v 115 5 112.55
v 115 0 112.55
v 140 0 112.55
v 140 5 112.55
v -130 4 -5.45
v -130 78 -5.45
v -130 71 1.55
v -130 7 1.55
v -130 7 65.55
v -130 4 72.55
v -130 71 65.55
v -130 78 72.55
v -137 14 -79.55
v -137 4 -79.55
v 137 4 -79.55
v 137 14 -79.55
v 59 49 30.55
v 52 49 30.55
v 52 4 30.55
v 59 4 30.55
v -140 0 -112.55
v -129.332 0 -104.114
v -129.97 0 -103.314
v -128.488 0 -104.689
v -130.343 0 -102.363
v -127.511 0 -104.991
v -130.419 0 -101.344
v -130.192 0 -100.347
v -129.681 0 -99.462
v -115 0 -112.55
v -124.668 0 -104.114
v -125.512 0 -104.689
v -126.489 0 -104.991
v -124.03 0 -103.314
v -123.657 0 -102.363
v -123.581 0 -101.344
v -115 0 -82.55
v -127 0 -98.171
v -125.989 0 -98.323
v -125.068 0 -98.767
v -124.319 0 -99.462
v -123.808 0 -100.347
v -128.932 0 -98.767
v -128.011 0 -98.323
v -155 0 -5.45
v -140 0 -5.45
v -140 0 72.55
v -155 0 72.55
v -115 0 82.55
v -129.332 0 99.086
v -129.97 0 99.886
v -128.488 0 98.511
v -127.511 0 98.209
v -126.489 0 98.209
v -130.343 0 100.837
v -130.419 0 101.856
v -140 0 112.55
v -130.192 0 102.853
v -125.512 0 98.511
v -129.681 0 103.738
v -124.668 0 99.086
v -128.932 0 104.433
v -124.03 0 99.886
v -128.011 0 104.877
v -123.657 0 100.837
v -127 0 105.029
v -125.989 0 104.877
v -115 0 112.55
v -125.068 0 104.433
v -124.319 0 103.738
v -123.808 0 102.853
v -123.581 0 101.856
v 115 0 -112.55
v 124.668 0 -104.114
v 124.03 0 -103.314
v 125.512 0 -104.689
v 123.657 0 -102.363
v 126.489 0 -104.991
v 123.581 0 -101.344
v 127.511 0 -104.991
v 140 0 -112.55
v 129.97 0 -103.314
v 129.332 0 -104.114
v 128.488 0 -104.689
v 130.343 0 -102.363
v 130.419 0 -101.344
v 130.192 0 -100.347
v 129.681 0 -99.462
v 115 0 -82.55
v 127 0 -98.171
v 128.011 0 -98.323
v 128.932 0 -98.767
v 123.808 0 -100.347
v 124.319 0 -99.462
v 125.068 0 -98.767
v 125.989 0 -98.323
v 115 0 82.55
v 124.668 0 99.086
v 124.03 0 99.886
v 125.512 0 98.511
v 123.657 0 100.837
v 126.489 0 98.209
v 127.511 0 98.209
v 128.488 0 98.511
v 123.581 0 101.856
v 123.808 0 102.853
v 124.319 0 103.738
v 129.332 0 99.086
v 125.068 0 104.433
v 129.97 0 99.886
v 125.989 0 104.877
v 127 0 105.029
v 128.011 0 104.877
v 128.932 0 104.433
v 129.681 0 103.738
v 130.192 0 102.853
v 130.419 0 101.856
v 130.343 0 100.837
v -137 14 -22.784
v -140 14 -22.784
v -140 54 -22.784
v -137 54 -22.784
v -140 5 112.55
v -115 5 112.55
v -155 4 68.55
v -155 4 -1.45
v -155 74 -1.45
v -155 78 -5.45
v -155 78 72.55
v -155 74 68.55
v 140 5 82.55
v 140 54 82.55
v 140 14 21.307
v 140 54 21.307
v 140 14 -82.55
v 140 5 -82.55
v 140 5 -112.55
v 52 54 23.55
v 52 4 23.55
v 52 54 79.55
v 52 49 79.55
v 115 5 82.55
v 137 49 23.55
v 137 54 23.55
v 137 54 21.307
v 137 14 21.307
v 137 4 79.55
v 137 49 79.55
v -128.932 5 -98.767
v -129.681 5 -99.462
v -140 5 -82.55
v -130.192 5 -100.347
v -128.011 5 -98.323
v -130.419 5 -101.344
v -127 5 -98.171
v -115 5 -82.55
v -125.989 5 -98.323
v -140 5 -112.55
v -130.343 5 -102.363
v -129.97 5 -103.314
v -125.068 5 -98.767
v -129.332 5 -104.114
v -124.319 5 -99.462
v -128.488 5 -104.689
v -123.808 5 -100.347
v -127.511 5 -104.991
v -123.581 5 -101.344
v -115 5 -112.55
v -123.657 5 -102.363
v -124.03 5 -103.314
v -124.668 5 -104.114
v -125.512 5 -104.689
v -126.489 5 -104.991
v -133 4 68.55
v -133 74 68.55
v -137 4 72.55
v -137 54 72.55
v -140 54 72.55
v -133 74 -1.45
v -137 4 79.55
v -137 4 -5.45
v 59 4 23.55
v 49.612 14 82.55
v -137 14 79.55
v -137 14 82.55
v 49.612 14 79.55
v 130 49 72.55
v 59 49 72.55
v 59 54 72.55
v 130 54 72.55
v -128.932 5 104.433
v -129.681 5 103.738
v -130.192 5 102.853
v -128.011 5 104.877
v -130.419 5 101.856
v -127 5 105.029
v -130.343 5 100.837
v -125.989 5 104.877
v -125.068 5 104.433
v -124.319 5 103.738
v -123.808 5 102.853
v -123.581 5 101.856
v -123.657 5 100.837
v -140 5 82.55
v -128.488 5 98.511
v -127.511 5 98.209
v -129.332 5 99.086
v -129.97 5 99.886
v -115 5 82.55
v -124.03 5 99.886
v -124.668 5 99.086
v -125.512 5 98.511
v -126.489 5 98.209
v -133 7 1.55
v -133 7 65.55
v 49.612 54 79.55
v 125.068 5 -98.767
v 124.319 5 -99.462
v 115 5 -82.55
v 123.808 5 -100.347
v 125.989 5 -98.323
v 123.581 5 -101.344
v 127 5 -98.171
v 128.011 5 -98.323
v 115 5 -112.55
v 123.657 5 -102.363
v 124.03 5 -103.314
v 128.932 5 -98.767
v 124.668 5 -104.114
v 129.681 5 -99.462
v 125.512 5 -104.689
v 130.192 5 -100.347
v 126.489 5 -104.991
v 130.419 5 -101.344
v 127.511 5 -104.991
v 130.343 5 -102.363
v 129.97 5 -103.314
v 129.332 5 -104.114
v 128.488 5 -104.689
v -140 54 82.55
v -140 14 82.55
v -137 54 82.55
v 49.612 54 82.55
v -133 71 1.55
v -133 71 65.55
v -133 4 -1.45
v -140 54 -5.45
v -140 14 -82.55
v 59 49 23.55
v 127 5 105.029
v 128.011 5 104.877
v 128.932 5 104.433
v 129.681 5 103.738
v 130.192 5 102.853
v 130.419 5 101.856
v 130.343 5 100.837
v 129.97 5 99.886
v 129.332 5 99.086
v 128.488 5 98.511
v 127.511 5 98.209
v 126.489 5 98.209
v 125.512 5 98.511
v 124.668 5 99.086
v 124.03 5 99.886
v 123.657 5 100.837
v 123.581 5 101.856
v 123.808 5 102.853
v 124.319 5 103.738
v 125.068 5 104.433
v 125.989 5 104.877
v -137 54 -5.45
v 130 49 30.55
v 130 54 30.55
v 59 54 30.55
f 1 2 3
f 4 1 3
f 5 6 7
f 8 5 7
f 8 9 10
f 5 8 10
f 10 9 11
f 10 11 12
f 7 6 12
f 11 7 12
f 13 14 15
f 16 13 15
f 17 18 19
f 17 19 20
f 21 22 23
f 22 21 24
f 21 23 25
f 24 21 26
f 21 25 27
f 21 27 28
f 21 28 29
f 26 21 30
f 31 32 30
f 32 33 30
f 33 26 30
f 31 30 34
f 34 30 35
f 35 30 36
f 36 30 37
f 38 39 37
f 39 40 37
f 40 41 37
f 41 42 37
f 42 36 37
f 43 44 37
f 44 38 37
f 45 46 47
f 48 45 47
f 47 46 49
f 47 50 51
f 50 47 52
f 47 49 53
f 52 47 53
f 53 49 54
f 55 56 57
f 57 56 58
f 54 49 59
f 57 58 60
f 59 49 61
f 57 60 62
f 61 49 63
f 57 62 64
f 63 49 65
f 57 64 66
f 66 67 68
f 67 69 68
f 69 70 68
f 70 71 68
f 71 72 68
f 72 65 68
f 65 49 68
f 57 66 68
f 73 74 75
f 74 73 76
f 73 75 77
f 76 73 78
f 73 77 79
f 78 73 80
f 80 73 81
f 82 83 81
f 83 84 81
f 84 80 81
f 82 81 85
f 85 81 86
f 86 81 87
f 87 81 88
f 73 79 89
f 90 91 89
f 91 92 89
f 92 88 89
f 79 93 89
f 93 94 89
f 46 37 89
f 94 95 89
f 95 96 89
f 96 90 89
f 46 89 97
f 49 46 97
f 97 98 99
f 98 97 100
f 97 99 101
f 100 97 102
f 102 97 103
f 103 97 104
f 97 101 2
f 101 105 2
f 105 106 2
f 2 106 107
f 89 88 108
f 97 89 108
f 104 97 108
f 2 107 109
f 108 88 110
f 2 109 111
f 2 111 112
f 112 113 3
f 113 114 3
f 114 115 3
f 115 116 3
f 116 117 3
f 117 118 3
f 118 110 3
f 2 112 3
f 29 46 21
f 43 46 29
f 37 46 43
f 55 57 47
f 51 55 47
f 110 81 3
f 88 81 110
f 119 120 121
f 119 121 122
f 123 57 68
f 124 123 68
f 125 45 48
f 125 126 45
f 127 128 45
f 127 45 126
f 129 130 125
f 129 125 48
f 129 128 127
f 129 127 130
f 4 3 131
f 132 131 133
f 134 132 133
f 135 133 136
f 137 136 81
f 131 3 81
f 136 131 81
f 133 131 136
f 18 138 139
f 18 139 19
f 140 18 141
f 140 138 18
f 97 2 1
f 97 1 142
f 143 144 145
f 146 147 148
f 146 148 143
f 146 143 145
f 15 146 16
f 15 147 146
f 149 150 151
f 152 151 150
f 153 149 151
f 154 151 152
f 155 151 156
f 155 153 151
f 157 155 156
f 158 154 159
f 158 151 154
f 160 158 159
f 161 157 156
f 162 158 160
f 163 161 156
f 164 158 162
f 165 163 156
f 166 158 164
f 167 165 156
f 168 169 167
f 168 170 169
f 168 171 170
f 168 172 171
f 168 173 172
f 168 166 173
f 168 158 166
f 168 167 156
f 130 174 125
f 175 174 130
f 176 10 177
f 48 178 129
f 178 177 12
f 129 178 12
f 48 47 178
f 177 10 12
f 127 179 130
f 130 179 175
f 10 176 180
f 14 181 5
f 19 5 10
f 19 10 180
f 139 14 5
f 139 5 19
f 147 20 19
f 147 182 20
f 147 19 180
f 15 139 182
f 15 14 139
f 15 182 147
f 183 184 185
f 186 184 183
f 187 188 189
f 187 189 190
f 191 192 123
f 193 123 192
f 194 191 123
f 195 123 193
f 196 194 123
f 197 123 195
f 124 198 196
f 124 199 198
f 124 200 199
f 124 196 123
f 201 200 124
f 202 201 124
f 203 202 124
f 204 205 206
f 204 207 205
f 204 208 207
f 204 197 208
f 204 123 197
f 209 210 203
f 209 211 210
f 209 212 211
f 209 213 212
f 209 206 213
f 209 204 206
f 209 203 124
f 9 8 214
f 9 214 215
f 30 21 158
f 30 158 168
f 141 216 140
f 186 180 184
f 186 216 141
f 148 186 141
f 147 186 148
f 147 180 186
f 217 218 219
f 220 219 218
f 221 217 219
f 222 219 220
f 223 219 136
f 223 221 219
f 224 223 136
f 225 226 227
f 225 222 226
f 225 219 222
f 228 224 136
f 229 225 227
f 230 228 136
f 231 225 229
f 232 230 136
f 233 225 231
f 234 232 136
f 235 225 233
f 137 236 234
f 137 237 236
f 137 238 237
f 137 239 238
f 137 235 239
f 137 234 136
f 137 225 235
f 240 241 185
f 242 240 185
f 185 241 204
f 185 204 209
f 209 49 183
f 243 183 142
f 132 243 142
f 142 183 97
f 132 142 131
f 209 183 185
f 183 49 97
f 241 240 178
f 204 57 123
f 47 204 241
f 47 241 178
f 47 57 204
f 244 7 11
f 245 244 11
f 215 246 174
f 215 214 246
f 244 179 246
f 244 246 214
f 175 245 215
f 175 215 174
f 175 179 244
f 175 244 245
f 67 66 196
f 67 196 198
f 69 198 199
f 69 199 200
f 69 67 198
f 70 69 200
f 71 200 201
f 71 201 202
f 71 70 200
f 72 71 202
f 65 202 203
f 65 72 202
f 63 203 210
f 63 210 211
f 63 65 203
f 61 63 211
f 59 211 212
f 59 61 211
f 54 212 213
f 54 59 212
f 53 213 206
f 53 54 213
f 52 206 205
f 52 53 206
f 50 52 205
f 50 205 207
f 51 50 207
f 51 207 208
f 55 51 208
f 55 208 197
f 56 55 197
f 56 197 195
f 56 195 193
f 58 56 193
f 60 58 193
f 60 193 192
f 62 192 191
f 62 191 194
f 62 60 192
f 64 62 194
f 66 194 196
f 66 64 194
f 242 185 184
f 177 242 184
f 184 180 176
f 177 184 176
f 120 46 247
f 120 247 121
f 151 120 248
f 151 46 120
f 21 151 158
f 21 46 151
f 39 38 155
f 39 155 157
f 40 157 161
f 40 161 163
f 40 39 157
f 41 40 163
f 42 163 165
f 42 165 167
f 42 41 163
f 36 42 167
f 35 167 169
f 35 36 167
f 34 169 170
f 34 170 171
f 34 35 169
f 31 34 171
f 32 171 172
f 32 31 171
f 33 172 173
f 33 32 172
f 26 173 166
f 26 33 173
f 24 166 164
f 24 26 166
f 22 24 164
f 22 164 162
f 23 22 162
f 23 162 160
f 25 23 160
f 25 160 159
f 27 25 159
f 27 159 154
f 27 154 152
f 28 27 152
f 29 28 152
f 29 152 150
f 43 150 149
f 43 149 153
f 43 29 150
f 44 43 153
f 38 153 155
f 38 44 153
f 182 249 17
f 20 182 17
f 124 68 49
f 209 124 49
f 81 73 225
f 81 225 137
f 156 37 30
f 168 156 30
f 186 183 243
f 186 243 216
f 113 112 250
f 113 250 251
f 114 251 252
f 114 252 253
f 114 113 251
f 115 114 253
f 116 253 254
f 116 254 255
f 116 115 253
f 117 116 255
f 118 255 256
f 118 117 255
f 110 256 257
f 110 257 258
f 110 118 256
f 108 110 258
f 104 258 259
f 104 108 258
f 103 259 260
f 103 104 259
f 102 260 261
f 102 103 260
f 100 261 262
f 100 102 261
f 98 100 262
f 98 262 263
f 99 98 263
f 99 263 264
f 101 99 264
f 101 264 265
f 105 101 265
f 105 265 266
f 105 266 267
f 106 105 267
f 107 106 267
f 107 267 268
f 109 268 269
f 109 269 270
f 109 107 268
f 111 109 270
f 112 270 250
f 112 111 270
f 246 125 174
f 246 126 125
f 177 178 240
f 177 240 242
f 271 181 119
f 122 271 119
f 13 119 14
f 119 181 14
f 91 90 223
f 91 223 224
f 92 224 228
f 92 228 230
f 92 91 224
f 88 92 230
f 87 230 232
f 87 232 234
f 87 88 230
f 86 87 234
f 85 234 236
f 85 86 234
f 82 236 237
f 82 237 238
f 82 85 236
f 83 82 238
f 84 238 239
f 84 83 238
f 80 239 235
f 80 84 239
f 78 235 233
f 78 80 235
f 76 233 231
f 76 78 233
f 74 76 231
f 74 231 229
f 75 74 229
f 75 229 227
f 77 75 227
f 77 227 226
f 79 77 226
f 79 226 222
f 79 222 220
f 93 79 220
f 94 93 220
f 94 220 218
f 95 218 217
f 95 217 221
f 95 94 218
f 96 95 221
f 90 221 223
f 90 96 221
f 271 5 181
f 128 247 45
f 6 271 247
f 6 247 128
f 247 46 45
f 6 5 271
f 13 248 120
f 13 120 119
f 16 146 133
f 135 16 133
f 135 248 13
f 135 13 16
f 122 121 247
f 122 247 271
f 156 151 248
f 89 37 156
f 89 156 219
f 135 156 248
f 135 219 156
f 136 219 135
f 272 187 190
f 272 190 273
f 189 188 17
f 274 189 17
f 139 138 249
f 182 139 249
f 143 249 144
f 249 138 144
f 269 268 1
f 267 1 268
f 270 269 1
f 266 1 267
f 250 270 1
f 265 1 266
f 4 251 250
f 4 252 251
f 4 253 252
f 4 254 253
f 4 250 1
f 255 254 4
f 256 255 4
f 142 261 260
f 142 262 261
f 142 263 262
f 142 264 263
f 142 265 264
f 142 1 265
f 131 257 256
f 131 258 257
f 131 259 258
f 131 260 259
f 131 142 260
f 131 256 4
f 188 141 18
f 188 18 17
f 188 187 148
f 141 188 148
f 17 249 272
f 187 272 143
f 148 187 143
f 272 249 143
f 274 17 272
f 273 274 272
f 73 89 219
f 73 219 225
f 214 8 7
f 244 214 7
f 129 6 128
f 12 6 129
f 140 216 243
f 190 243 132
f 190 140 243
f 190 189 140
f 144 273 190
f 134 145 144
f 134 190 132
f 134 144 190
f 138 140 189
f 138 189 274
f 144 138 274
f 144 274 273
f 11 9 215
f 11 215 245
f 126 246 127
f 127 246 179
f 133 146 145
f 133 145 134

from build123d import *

# Parameters (mm, degrees)
SKETCH1_W             = 280
SKETCH1_H             = 165.1
FLOOR_2_DEPTH         = 4
SKETCH2_W             = 280
SKETCH2_H             = 165.1
SKETCH2_W_2           = 274
SKETCH2_H_2           = 159.1
WALL_DEPTH            = 10
RPI_START             = 45
SKETCH4_W             = 85
SKETCH4_H             = 56
SKETCH4_W_2           = 71
SKETCH4_H_2           = 42
RPI_STAND_DEPTH       = 5
SKETCH7_W             = 3
SKETCH7_H             = 105.333904831
TEMP_SUPPORT_DEPTH    = 40
SKETCH3_W             = 25
SKETCH3_H             = 30
SKETCH3_R             = 3.429
BRACKETS_DEPTH        = 5
FAN_HOLDER_DEPTH      = 15
FAN_HOLDER_DEPTH_BACK = 10
SKETCH5_W             = 78
SKETCH5_H             = 78
SKETCH5_W_2           = 70
SKETCH5_H_2           = 70
SKETCH8_W             = 70
SKETCH8_H             = 50
FAN_HOLE_DEPTH        = 3
SKETCH11_W            = 78
SKETCH11_H            = 78
SKETCH11_W_2          = 64
SKETCH11_H_2          = 64
BOSS_EXTRUDE9_DEPTH   = 3
BOSS_EXTRUDE10_REACH  = 199.721
SKETCH12_W            = 7
SKETCH12_H            = 7


with BuildPart() as part:
    # Sketch1 → Floor 2 (new body)
    with BuildSketch(Plane(origin=(0, 0, 0), x_dir=(1, 0, 0), z_dir=(0, 1, 0))):
        Rectangle(SKETCH1_W, SKETCH1_H)
    extrude(amount=FLOOR_2_DEPTH)

    # Sketch2 → Wall (add)
    with BuildSketch(Plane(origin=(0, 4, 0), x_dir=(1, 0, 0), z_dir=(0, 1, 0))):
        Rectangle(SKETCH2_W, SKETCH2_H)
        Rectangle(SKETCH2_W_2, SKETCH2_H_2, mode=Mode.SUBTRACT)
    extrude(amount=WALL_DEPTH)

    # Sketch7 → Temp support (add)
    with BuildSketch(Plane(origin=(0, 14, 0), x_dir=(1, 0, 0), z_dir=(0, 1, 0))):
        with Locations((-138.5, -29.883047585)):
            Rectangle(SKETCH7_W, SKETCH7_H)
        Polygon((140, -82.55), (49.61228981, -82.55), (49.61228981, -79.55), (137, -79.55), (137, -21.306937857), (140, -21.306937857), (140, -79.55), align=None)
    extrude(amount=TEMP_SUPPORT_DEPTH)

    # Sketch3 → Brackets (add)
    # profile 1 of 4: a face of its own
    with BuildSketch(Plane(origin=(0, 0, 0), x_dir=(1, 0, 0), z_dir=(0, 1, 0))):
        with Locations((-127.5, 97.55)):
            Rectangle(SKETCH3_W, SKETCH3_H)
        with Locations(Location((-127, 101.6, 0), (0, 0, 270))):
            Circle(SKETCH3_R, mode=Mode.SUBTRACT)
    # profile 2 of 4: a face of its own
    with BuildSketch(Plane(origin=(0, 0, 0), x_dir=(1, 0, 0), z_dir=(0, 1, 0))):
        with Locations((127.5, 97.55)):
            Rectangle(SKETCH3_W, SKETCH3_H)
        with Locations(Location((127, 101.6, 0), (0, 0, 270))):
            Circle(SKETCH3_R, mode=Mode.SUBTRACT)
    # profile 3 of 4: a face of its own
    with BuildSketch(Plane(origin=(0, 0, 0), x_dir=(1, 0, 0), z_dir=(0, 1, 0))):
        with Locations((-127.5, -97.55)):
            Rectangle(SKETCH3_W, SKETCH3_H)
        with Locations(Location((-127, -101.6, 0), (0, 0, 270))):
            Circle(SKETCH3_R, mode=Mode.SUBTRACT)
    # profile 4 of 4: a face of its own
    with BuildSketch(Plane(origin=(0, 0, 0), x_dir=(1, 0, 0), z_dir=(0, 1, 0))):
        with Locations((127.5, -97.55)):
            Rectangle(SKETCH3_W, SKETCH3_H)
        with Locations(Location((127, -101.6, 0), (0, 0, 270))):
            Circle(SKETCH3_R, mode=Mode.SUBTRACT)
    extrude(amount=BRACKETS_DEPTH)

    # Sketch5 → Fan Holder (add, two sides: drawn at the far end of the back side and taken through both)
    with BuildSketch(Plane.ZY.offset(140).offset(-FAN_HOLDER_DEPTH_BACK)):
        with Locations((33.55, 39)):
            Rectangle(SKETCH5_W, SKETCH5_H)
        with Locations((33.55, 39)):
            Rectangle(SKETCH5_W_2, SKETCH5_H_2, mode=Mode.SUBTRACT)
    extrude(amount=FAN_HOLDER_DEPTH + FAN_HOLDER_DEPTH_BACK)

    # Sketch8 → Fan hole (cut)
    with BuildSketch(Plane.ZY.offset(140)):
        with Locations((33.55, 29)):
            Rectangle(SKETCH8_W, SKETCH8_H)
    extrude(amount=-FAN_HOLE_DEPTH, mode=Mode.SUBTRACT)

    # Sketch11 → Boss-Extrude9 (add)
    with BuildSketch(Plane.ZY.offset(130)):
        with Locations((33.55, 39)):
            Rectangle(SKETCH11_W, SKETCH11_H)
        with Locations((33.55, 39)):
            Rectangle(SKETCH11_W_2, SKETCH11_H_2, mode=Mode.SUBTRACT)
    extrude(amount=BOSS_EXTRUDE9_DEPTH)

    # Sketch12 → Boss-Extrude10 (add, up to next)
    with BuildSketch(Plane.XZ.offset(-49), mode=Mode.PRIVATE) as boss_extrude10_sk1:
        with Locations((55.5, 27.05)):
            Rectangle(SKETCH12_W, SKETCH12_H)
    boss_extrude10_tool1 = extrude(boss_extrude10_sk1.sketch, amount=BOSS_EXTRUDE10_REACH, mode=Mode.PRIVATE) - part.part


with BuildPart() as body_2:
    # Sketch4 → Rpi stand (new body)
    with BuildSketch(Plane(origin=(0, 4, 0), x_dir=(1, 0, 0), z_dir=(0, 1, 0)).offset(RPI_START)):
        with Locations((94.5, -51.55)):
            Rectangle(SKETCH4_W, SKETCH4_H)
        with Locations((94.5, -51.55)):
            Rectangle(SKETCH4_W_2, SKETCH4_H_2, mode=Mode.SUBTRACT)
    extrude(amount=RPI_STAND_DEPTH)


with BuildPart() as part_1:
    add(part.part)

    add(body_2.part)  # Boss-Extrude10 merges body 2
    add(boss_extrude10_tool1.solids().sort_by_distance((55.5, 49, 27.05))[0])


solid = part_1.part
